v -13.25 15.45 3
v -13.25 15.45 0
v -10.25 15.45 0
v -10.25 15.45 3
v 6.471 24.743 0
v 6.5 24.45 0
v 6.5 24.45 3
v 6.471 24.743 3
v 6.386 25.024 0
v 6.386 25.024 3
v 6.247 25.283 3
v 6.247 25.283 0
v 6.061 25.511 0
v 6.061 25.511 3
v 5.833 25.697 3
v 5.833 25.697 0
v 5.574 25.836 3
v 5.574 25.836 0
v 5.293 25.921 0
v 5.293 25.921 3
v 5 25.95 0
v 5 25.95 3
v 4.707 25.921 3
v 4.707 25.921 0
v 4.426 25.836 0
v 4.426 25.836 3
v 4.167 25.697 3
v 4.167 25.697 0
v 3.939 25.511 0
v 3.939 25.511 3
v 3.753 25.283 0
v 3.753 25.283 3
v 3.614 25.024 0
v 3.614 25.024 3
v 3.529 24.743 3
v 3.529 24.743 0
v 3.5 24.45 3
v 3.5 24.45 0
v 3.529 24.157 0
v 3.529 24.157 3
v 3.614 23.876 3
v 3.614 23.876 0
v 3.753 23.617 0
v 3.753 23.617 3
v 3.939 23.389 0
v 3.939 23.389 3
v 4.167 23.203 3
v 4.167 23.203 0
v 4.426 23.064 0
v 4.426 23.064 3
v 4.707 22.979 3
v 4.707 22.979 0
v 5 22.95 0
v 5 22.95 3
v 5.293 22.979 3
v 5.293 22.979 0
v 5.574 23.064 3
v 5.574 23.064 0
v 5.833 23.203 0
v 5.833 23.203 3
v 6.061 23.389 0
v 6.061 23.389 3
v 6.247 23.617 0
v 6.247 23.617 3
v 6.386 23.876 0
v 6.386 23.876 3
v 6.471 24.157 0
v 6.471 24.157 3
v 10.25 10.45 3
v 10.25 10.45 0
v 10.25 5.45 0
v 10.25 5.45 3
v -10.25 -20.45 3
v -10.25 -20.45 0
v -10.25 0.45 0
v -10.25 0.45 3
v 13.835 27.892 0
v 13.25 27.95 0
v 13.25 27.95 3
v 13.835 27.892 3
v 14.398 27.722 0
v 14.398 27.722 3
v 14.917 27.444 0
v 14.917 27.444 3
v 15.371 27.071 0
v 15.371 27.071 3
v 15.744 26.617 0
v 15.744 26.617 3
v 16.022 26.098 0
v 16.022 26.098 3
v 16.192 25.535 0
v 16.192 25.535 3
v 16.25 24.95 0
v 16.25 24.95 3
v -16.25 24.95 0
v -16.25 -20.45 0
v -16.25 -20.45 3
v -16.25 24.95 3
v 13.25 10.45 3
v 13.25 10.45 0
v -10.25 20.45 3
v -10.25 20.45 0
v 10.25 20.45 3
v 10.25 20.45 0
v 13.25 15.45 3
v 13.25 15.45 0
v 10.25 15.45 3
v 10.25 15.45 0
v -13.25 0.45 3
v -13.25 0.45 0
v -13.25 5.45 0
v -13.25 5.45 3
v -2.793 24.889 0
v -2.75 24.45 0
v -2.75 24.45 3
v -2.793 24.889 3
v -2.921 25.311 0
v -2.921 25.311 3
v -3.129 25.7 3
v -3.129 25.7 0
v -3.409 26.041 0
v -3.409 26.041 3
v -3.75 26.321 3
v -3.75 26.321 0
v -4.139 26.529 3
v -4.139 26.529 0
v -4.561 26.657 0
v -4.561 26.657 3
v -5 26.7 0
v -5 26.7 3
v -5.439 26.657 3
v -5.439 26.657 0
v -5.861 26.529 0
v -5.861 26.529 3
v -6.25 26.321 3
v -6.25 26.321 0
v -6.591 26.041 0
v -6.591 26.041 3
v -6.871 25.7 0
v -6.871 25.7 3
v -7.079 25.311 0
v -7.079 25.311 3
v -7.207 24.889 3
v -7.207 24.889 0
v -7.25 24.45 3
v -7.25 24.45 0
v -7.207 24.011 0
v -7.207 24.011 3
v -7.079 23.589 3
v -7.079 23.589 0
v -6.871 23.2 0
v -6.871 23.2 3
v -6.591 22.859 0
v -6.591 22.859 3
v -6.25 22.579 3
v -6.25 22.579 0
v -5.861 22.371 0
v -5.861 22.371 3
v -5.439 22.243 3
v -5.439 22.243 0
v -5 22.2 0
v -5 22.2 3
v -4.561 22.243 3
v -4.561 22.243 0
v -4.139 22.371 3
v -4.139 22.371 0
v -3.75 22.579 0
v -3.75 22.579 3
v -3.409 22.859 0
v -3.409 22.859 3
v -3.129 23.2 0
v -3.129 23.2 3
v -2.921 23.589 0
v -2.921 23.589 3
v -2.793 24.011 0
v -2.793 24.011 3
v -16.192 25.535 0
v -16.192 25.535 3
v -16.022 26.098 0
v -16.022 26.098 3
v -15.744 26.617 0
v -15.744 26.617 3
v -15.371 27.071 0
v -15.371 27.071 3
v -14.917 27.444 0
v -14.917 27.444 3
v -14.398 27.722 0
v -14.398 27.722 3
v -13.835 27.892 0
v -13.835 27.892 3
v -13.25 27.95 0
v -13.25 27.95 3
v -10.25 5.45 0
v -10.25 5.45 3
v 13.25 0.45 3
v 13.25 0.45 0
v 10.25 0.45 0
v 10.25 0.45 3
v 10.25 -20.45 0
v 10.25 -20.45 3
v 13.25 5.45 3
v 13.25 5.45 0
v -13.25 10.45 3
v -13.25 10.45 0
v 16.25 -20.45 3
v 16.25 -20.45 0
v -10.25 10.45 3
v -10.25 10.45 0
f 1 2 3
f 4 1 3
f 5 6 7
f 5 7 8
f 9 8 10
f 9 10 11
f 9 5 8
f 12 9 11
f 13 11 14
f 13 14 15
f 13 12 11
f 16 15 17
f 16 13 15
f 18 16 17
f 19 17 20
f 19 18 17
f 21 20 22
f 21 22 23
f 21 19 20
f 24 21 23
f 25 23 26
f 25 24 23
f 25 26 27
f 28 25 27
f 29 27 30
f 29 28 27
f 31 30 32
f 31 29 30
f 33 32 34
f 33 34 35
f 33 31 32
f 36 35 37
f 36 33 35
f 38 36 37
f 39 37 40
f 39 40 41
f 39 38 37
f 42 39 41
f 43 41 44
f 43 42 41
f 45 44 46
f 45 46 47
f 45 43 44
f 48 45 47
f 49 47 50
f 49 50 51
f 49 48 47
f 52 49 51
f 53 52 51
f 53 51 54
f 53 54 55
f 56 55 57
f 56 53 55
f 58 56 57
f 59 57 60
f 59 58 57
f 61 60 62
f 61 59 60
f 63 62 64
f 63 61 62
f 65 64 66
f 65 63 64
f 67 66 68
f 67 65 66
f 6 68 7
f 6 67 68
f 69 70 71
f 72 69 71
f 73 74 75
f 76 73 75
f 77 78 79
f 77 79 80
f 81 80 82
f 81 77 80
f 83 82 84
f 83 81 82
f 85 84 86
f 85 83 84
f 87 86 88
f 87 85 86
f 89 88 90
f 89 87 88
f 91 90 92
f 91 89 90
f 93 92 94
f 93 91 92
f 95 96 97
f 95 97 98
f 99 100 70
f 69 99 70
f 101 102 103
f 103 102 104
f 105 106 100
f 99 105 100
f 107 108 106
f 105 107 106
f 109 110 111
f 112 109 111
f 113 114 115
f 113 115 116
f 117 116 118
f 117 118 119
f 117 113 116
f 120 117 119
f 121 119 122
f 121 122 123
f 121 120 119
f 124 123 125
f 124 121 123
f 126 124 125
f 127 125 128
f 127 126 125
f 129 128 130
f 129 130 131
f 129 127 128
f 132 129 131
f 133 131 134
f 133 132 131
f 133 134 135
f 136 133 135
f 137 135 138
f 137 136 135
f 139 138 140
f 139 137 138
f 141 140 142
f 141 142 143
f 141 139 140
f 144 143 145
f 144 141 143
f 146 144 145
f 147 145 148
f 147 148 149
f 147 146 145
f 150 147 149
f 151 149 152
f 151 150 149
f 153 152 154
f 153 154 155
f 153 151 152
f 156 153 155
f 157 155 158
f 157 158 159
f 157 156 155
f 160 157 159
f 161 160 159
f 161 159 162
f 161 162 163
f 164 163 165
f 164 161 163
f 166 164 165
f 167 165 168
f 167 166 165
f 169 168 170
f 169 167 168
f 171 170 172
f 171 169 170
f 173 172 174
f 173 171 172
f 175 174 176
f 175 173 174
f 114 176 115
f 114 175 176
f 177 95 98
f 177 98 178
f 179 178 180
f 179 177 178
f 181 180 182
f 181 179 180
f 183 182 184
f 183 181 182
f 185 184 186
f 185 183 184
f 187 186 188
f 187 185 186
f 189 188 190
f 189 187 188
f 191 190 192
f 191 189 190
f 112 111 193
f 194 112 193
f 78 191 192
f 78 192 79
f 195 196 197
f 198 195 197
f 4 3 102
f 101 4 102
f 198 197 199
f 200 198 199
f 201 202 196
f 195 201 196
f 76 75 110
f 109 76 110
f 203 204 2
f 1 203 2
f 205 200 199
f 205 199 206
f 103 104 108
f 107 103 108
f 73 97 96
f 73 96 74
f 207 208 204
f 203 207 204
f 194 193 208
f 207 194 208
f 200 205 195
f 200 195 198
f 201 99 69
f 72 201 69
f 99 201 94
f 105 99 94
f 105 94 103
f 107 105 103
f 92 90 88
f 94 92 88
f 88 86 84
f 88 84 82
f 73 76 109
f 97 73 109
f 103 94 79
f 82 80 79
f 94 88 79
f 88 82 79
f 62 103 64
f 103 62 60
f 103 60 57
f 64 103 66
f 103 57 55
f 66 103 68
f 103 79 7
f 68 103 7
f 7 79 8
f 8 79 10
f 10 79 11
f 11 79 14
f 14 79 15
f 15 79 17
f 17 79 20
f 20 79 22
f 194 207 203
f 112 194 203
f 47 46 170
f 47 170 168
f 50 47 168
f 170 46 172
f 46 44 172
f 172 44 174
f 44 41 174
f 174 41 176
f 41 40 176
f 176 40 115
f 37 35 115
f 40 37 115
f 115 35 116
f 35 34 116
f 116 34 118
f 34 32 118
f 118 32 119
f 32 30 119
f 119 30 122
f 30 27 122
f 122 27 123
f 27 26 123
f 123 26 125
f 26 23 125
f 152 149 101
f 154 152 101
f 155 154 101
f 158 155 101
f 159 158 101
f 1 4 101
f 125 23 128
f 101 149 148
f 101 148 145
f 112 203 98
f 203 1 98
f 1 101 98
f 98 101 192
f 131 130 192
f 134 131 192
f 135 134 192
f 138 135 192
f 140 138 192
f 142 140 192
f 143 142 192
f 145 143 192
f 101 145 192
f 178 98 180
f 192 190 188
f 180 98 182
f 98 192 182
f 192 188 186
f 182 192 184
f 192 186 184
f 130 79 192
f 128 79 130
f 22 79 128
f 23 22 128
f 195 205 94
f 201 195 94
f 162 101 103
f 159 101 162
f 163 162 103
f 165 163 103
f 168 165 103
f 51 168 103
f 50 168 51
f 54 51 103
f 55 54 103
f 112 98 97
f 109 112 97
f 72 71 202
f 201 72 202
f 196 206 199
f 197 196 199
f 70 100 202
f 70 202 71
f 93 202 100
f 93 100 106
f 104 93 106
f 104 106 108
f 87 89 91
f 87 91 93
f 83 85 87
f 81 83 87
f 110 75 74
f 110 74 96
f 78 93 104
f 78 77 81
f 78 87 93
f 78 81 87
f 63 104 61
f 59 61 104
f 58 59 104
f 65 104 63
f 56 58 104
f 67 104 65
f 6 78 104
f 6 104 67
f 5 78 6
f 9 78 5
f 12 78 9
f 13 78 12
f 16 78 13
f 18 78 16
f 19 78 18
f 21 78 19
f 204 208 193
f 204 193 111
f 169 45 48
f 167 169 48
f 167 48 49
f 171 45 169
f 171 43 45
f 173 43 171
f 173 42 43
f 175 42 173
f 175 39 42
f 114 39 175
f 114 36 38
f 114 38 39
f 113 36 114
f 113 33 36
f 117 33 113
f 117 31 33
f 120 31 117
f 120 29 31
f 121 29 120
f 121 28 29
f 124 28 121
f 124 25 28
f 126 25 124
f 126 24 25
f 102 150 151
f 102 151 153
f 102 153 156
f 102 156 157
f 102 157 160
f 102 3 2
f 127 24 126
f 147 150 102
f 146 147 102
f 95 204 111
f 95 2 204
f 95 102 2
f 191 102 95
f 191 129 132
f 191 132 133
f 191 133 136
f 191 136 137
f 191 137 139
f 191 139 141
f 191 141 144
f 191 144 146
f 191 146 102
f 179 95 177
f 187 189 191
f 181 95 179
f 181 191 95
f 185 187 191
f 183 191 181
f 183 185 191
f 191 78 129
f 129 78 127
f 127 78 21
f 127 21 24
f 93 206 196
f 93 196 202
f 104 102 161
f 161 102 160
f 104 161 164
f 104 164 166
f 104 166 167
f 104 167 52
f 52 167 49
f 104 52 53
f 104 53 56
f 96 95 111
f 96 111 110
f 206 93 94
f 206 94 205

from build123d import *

# Parameters (mm, degrees)
SKETCH1_R             = 2.25
SKETCH1_R_2           = 1.5
BOSS_EXTRUDE1_DEPTH   = 3
CORTAR_EXTRUIR1_REACH = 34.469
CROQUIS1_W            = 32.5
CROQUIS1_H            = 7.5


with BuildPart() as part:
    # Sketch1 → Boss-Extrude1 (new body)
    with BuildSketch(Plane.XY):
        with BuildLine():
            Line((-13.25, 27.95), (13.25, 27.95))
            ThreePointArc((13.25, 27.95), (15.371320344, 27.071320344), (16.25, 24.95))
            Line((16.25, 24.95), (16.25, -24.95))
            ThreePointArc((16.25, -24.95), (15.371320344, -27.071320344), (13.25, -27.95))
            Line((13.25, -27.95), (-13.25, -27.95))
            ThreePointArc((-13.25, -27.95), (-15.371320344, -27.071320344), (-16.25, -24.95))
            Line((-16.25, -24.95), (-16.25, 24.95))
            ThreePointArc((-16.25, 24.95), (-15.371320344, 27.071320344), (-13.25, 27.95))
        make_face()
        with Locations((-5, 24.45)):
            Circle(SKETCH1_R, mode=Mode.SUBTRACT)
        with Locations((5, 24.45)):
            Circle(SKETCH1_R_2, mode=Mode.SUBTRACT)
        with Locations(Location((5, -24.45, 0), (0, 0, 180))):
            Circle(SKETCH1_R_2, mode=Mode.SUBTRACT)
        with Locations(Location((-5, -24.45, 0), (0, 0, 180))):
            Circle(SKETCH1_R, mode=Mode.SUBTRACT)
        Polygon((-10.25, 20.45), (10.25, 20.45), (10.25, 15.45), (13.25, 15.45), (13.25, 10.45), (10.25, 10.45), (10.25, 5.45), (13.25, 5.45), (13.25, 0.45), (10.25, 0.45), (10.25, -20.45), (-10.25, -20.45), (-10.25, 0.45), (-13.25, 0.45), (-13.25, 5.45), (-10.25, 5.45), (-10.25, 10.45), (-13.25, 10.45), (-13.25, 15.45), (-10.25, 15.45), align=None, mode=Mode.SUBTRACT)
    extrude(amount=BOSS_EXTRUDE1_DEPTH)

    # Croquis1 → Cortar-Extruir1 (cut, up to next)
    with BuildSketch(Plane.XY.offset(3), mode=Mode.PRIVATE) as cortar_extruir1_sk1:
        with Locations((0, -24.2)):
            Rectangle(CROQUIS1_W, CROQUIS1_H)
    cortar_extruir1_tool1 = extrude(cortar_extruir1_sk1.sketch, amount=-CORTAR_EXTRUIR1_REACH, mode=Mode.PRIVATE) & part.part
    add(cortar_extruir1_tool1.solids().sort_by_distance((0, -24.2, 3))[0], mode=Mode.SUBTRACT)


solid = part.part
